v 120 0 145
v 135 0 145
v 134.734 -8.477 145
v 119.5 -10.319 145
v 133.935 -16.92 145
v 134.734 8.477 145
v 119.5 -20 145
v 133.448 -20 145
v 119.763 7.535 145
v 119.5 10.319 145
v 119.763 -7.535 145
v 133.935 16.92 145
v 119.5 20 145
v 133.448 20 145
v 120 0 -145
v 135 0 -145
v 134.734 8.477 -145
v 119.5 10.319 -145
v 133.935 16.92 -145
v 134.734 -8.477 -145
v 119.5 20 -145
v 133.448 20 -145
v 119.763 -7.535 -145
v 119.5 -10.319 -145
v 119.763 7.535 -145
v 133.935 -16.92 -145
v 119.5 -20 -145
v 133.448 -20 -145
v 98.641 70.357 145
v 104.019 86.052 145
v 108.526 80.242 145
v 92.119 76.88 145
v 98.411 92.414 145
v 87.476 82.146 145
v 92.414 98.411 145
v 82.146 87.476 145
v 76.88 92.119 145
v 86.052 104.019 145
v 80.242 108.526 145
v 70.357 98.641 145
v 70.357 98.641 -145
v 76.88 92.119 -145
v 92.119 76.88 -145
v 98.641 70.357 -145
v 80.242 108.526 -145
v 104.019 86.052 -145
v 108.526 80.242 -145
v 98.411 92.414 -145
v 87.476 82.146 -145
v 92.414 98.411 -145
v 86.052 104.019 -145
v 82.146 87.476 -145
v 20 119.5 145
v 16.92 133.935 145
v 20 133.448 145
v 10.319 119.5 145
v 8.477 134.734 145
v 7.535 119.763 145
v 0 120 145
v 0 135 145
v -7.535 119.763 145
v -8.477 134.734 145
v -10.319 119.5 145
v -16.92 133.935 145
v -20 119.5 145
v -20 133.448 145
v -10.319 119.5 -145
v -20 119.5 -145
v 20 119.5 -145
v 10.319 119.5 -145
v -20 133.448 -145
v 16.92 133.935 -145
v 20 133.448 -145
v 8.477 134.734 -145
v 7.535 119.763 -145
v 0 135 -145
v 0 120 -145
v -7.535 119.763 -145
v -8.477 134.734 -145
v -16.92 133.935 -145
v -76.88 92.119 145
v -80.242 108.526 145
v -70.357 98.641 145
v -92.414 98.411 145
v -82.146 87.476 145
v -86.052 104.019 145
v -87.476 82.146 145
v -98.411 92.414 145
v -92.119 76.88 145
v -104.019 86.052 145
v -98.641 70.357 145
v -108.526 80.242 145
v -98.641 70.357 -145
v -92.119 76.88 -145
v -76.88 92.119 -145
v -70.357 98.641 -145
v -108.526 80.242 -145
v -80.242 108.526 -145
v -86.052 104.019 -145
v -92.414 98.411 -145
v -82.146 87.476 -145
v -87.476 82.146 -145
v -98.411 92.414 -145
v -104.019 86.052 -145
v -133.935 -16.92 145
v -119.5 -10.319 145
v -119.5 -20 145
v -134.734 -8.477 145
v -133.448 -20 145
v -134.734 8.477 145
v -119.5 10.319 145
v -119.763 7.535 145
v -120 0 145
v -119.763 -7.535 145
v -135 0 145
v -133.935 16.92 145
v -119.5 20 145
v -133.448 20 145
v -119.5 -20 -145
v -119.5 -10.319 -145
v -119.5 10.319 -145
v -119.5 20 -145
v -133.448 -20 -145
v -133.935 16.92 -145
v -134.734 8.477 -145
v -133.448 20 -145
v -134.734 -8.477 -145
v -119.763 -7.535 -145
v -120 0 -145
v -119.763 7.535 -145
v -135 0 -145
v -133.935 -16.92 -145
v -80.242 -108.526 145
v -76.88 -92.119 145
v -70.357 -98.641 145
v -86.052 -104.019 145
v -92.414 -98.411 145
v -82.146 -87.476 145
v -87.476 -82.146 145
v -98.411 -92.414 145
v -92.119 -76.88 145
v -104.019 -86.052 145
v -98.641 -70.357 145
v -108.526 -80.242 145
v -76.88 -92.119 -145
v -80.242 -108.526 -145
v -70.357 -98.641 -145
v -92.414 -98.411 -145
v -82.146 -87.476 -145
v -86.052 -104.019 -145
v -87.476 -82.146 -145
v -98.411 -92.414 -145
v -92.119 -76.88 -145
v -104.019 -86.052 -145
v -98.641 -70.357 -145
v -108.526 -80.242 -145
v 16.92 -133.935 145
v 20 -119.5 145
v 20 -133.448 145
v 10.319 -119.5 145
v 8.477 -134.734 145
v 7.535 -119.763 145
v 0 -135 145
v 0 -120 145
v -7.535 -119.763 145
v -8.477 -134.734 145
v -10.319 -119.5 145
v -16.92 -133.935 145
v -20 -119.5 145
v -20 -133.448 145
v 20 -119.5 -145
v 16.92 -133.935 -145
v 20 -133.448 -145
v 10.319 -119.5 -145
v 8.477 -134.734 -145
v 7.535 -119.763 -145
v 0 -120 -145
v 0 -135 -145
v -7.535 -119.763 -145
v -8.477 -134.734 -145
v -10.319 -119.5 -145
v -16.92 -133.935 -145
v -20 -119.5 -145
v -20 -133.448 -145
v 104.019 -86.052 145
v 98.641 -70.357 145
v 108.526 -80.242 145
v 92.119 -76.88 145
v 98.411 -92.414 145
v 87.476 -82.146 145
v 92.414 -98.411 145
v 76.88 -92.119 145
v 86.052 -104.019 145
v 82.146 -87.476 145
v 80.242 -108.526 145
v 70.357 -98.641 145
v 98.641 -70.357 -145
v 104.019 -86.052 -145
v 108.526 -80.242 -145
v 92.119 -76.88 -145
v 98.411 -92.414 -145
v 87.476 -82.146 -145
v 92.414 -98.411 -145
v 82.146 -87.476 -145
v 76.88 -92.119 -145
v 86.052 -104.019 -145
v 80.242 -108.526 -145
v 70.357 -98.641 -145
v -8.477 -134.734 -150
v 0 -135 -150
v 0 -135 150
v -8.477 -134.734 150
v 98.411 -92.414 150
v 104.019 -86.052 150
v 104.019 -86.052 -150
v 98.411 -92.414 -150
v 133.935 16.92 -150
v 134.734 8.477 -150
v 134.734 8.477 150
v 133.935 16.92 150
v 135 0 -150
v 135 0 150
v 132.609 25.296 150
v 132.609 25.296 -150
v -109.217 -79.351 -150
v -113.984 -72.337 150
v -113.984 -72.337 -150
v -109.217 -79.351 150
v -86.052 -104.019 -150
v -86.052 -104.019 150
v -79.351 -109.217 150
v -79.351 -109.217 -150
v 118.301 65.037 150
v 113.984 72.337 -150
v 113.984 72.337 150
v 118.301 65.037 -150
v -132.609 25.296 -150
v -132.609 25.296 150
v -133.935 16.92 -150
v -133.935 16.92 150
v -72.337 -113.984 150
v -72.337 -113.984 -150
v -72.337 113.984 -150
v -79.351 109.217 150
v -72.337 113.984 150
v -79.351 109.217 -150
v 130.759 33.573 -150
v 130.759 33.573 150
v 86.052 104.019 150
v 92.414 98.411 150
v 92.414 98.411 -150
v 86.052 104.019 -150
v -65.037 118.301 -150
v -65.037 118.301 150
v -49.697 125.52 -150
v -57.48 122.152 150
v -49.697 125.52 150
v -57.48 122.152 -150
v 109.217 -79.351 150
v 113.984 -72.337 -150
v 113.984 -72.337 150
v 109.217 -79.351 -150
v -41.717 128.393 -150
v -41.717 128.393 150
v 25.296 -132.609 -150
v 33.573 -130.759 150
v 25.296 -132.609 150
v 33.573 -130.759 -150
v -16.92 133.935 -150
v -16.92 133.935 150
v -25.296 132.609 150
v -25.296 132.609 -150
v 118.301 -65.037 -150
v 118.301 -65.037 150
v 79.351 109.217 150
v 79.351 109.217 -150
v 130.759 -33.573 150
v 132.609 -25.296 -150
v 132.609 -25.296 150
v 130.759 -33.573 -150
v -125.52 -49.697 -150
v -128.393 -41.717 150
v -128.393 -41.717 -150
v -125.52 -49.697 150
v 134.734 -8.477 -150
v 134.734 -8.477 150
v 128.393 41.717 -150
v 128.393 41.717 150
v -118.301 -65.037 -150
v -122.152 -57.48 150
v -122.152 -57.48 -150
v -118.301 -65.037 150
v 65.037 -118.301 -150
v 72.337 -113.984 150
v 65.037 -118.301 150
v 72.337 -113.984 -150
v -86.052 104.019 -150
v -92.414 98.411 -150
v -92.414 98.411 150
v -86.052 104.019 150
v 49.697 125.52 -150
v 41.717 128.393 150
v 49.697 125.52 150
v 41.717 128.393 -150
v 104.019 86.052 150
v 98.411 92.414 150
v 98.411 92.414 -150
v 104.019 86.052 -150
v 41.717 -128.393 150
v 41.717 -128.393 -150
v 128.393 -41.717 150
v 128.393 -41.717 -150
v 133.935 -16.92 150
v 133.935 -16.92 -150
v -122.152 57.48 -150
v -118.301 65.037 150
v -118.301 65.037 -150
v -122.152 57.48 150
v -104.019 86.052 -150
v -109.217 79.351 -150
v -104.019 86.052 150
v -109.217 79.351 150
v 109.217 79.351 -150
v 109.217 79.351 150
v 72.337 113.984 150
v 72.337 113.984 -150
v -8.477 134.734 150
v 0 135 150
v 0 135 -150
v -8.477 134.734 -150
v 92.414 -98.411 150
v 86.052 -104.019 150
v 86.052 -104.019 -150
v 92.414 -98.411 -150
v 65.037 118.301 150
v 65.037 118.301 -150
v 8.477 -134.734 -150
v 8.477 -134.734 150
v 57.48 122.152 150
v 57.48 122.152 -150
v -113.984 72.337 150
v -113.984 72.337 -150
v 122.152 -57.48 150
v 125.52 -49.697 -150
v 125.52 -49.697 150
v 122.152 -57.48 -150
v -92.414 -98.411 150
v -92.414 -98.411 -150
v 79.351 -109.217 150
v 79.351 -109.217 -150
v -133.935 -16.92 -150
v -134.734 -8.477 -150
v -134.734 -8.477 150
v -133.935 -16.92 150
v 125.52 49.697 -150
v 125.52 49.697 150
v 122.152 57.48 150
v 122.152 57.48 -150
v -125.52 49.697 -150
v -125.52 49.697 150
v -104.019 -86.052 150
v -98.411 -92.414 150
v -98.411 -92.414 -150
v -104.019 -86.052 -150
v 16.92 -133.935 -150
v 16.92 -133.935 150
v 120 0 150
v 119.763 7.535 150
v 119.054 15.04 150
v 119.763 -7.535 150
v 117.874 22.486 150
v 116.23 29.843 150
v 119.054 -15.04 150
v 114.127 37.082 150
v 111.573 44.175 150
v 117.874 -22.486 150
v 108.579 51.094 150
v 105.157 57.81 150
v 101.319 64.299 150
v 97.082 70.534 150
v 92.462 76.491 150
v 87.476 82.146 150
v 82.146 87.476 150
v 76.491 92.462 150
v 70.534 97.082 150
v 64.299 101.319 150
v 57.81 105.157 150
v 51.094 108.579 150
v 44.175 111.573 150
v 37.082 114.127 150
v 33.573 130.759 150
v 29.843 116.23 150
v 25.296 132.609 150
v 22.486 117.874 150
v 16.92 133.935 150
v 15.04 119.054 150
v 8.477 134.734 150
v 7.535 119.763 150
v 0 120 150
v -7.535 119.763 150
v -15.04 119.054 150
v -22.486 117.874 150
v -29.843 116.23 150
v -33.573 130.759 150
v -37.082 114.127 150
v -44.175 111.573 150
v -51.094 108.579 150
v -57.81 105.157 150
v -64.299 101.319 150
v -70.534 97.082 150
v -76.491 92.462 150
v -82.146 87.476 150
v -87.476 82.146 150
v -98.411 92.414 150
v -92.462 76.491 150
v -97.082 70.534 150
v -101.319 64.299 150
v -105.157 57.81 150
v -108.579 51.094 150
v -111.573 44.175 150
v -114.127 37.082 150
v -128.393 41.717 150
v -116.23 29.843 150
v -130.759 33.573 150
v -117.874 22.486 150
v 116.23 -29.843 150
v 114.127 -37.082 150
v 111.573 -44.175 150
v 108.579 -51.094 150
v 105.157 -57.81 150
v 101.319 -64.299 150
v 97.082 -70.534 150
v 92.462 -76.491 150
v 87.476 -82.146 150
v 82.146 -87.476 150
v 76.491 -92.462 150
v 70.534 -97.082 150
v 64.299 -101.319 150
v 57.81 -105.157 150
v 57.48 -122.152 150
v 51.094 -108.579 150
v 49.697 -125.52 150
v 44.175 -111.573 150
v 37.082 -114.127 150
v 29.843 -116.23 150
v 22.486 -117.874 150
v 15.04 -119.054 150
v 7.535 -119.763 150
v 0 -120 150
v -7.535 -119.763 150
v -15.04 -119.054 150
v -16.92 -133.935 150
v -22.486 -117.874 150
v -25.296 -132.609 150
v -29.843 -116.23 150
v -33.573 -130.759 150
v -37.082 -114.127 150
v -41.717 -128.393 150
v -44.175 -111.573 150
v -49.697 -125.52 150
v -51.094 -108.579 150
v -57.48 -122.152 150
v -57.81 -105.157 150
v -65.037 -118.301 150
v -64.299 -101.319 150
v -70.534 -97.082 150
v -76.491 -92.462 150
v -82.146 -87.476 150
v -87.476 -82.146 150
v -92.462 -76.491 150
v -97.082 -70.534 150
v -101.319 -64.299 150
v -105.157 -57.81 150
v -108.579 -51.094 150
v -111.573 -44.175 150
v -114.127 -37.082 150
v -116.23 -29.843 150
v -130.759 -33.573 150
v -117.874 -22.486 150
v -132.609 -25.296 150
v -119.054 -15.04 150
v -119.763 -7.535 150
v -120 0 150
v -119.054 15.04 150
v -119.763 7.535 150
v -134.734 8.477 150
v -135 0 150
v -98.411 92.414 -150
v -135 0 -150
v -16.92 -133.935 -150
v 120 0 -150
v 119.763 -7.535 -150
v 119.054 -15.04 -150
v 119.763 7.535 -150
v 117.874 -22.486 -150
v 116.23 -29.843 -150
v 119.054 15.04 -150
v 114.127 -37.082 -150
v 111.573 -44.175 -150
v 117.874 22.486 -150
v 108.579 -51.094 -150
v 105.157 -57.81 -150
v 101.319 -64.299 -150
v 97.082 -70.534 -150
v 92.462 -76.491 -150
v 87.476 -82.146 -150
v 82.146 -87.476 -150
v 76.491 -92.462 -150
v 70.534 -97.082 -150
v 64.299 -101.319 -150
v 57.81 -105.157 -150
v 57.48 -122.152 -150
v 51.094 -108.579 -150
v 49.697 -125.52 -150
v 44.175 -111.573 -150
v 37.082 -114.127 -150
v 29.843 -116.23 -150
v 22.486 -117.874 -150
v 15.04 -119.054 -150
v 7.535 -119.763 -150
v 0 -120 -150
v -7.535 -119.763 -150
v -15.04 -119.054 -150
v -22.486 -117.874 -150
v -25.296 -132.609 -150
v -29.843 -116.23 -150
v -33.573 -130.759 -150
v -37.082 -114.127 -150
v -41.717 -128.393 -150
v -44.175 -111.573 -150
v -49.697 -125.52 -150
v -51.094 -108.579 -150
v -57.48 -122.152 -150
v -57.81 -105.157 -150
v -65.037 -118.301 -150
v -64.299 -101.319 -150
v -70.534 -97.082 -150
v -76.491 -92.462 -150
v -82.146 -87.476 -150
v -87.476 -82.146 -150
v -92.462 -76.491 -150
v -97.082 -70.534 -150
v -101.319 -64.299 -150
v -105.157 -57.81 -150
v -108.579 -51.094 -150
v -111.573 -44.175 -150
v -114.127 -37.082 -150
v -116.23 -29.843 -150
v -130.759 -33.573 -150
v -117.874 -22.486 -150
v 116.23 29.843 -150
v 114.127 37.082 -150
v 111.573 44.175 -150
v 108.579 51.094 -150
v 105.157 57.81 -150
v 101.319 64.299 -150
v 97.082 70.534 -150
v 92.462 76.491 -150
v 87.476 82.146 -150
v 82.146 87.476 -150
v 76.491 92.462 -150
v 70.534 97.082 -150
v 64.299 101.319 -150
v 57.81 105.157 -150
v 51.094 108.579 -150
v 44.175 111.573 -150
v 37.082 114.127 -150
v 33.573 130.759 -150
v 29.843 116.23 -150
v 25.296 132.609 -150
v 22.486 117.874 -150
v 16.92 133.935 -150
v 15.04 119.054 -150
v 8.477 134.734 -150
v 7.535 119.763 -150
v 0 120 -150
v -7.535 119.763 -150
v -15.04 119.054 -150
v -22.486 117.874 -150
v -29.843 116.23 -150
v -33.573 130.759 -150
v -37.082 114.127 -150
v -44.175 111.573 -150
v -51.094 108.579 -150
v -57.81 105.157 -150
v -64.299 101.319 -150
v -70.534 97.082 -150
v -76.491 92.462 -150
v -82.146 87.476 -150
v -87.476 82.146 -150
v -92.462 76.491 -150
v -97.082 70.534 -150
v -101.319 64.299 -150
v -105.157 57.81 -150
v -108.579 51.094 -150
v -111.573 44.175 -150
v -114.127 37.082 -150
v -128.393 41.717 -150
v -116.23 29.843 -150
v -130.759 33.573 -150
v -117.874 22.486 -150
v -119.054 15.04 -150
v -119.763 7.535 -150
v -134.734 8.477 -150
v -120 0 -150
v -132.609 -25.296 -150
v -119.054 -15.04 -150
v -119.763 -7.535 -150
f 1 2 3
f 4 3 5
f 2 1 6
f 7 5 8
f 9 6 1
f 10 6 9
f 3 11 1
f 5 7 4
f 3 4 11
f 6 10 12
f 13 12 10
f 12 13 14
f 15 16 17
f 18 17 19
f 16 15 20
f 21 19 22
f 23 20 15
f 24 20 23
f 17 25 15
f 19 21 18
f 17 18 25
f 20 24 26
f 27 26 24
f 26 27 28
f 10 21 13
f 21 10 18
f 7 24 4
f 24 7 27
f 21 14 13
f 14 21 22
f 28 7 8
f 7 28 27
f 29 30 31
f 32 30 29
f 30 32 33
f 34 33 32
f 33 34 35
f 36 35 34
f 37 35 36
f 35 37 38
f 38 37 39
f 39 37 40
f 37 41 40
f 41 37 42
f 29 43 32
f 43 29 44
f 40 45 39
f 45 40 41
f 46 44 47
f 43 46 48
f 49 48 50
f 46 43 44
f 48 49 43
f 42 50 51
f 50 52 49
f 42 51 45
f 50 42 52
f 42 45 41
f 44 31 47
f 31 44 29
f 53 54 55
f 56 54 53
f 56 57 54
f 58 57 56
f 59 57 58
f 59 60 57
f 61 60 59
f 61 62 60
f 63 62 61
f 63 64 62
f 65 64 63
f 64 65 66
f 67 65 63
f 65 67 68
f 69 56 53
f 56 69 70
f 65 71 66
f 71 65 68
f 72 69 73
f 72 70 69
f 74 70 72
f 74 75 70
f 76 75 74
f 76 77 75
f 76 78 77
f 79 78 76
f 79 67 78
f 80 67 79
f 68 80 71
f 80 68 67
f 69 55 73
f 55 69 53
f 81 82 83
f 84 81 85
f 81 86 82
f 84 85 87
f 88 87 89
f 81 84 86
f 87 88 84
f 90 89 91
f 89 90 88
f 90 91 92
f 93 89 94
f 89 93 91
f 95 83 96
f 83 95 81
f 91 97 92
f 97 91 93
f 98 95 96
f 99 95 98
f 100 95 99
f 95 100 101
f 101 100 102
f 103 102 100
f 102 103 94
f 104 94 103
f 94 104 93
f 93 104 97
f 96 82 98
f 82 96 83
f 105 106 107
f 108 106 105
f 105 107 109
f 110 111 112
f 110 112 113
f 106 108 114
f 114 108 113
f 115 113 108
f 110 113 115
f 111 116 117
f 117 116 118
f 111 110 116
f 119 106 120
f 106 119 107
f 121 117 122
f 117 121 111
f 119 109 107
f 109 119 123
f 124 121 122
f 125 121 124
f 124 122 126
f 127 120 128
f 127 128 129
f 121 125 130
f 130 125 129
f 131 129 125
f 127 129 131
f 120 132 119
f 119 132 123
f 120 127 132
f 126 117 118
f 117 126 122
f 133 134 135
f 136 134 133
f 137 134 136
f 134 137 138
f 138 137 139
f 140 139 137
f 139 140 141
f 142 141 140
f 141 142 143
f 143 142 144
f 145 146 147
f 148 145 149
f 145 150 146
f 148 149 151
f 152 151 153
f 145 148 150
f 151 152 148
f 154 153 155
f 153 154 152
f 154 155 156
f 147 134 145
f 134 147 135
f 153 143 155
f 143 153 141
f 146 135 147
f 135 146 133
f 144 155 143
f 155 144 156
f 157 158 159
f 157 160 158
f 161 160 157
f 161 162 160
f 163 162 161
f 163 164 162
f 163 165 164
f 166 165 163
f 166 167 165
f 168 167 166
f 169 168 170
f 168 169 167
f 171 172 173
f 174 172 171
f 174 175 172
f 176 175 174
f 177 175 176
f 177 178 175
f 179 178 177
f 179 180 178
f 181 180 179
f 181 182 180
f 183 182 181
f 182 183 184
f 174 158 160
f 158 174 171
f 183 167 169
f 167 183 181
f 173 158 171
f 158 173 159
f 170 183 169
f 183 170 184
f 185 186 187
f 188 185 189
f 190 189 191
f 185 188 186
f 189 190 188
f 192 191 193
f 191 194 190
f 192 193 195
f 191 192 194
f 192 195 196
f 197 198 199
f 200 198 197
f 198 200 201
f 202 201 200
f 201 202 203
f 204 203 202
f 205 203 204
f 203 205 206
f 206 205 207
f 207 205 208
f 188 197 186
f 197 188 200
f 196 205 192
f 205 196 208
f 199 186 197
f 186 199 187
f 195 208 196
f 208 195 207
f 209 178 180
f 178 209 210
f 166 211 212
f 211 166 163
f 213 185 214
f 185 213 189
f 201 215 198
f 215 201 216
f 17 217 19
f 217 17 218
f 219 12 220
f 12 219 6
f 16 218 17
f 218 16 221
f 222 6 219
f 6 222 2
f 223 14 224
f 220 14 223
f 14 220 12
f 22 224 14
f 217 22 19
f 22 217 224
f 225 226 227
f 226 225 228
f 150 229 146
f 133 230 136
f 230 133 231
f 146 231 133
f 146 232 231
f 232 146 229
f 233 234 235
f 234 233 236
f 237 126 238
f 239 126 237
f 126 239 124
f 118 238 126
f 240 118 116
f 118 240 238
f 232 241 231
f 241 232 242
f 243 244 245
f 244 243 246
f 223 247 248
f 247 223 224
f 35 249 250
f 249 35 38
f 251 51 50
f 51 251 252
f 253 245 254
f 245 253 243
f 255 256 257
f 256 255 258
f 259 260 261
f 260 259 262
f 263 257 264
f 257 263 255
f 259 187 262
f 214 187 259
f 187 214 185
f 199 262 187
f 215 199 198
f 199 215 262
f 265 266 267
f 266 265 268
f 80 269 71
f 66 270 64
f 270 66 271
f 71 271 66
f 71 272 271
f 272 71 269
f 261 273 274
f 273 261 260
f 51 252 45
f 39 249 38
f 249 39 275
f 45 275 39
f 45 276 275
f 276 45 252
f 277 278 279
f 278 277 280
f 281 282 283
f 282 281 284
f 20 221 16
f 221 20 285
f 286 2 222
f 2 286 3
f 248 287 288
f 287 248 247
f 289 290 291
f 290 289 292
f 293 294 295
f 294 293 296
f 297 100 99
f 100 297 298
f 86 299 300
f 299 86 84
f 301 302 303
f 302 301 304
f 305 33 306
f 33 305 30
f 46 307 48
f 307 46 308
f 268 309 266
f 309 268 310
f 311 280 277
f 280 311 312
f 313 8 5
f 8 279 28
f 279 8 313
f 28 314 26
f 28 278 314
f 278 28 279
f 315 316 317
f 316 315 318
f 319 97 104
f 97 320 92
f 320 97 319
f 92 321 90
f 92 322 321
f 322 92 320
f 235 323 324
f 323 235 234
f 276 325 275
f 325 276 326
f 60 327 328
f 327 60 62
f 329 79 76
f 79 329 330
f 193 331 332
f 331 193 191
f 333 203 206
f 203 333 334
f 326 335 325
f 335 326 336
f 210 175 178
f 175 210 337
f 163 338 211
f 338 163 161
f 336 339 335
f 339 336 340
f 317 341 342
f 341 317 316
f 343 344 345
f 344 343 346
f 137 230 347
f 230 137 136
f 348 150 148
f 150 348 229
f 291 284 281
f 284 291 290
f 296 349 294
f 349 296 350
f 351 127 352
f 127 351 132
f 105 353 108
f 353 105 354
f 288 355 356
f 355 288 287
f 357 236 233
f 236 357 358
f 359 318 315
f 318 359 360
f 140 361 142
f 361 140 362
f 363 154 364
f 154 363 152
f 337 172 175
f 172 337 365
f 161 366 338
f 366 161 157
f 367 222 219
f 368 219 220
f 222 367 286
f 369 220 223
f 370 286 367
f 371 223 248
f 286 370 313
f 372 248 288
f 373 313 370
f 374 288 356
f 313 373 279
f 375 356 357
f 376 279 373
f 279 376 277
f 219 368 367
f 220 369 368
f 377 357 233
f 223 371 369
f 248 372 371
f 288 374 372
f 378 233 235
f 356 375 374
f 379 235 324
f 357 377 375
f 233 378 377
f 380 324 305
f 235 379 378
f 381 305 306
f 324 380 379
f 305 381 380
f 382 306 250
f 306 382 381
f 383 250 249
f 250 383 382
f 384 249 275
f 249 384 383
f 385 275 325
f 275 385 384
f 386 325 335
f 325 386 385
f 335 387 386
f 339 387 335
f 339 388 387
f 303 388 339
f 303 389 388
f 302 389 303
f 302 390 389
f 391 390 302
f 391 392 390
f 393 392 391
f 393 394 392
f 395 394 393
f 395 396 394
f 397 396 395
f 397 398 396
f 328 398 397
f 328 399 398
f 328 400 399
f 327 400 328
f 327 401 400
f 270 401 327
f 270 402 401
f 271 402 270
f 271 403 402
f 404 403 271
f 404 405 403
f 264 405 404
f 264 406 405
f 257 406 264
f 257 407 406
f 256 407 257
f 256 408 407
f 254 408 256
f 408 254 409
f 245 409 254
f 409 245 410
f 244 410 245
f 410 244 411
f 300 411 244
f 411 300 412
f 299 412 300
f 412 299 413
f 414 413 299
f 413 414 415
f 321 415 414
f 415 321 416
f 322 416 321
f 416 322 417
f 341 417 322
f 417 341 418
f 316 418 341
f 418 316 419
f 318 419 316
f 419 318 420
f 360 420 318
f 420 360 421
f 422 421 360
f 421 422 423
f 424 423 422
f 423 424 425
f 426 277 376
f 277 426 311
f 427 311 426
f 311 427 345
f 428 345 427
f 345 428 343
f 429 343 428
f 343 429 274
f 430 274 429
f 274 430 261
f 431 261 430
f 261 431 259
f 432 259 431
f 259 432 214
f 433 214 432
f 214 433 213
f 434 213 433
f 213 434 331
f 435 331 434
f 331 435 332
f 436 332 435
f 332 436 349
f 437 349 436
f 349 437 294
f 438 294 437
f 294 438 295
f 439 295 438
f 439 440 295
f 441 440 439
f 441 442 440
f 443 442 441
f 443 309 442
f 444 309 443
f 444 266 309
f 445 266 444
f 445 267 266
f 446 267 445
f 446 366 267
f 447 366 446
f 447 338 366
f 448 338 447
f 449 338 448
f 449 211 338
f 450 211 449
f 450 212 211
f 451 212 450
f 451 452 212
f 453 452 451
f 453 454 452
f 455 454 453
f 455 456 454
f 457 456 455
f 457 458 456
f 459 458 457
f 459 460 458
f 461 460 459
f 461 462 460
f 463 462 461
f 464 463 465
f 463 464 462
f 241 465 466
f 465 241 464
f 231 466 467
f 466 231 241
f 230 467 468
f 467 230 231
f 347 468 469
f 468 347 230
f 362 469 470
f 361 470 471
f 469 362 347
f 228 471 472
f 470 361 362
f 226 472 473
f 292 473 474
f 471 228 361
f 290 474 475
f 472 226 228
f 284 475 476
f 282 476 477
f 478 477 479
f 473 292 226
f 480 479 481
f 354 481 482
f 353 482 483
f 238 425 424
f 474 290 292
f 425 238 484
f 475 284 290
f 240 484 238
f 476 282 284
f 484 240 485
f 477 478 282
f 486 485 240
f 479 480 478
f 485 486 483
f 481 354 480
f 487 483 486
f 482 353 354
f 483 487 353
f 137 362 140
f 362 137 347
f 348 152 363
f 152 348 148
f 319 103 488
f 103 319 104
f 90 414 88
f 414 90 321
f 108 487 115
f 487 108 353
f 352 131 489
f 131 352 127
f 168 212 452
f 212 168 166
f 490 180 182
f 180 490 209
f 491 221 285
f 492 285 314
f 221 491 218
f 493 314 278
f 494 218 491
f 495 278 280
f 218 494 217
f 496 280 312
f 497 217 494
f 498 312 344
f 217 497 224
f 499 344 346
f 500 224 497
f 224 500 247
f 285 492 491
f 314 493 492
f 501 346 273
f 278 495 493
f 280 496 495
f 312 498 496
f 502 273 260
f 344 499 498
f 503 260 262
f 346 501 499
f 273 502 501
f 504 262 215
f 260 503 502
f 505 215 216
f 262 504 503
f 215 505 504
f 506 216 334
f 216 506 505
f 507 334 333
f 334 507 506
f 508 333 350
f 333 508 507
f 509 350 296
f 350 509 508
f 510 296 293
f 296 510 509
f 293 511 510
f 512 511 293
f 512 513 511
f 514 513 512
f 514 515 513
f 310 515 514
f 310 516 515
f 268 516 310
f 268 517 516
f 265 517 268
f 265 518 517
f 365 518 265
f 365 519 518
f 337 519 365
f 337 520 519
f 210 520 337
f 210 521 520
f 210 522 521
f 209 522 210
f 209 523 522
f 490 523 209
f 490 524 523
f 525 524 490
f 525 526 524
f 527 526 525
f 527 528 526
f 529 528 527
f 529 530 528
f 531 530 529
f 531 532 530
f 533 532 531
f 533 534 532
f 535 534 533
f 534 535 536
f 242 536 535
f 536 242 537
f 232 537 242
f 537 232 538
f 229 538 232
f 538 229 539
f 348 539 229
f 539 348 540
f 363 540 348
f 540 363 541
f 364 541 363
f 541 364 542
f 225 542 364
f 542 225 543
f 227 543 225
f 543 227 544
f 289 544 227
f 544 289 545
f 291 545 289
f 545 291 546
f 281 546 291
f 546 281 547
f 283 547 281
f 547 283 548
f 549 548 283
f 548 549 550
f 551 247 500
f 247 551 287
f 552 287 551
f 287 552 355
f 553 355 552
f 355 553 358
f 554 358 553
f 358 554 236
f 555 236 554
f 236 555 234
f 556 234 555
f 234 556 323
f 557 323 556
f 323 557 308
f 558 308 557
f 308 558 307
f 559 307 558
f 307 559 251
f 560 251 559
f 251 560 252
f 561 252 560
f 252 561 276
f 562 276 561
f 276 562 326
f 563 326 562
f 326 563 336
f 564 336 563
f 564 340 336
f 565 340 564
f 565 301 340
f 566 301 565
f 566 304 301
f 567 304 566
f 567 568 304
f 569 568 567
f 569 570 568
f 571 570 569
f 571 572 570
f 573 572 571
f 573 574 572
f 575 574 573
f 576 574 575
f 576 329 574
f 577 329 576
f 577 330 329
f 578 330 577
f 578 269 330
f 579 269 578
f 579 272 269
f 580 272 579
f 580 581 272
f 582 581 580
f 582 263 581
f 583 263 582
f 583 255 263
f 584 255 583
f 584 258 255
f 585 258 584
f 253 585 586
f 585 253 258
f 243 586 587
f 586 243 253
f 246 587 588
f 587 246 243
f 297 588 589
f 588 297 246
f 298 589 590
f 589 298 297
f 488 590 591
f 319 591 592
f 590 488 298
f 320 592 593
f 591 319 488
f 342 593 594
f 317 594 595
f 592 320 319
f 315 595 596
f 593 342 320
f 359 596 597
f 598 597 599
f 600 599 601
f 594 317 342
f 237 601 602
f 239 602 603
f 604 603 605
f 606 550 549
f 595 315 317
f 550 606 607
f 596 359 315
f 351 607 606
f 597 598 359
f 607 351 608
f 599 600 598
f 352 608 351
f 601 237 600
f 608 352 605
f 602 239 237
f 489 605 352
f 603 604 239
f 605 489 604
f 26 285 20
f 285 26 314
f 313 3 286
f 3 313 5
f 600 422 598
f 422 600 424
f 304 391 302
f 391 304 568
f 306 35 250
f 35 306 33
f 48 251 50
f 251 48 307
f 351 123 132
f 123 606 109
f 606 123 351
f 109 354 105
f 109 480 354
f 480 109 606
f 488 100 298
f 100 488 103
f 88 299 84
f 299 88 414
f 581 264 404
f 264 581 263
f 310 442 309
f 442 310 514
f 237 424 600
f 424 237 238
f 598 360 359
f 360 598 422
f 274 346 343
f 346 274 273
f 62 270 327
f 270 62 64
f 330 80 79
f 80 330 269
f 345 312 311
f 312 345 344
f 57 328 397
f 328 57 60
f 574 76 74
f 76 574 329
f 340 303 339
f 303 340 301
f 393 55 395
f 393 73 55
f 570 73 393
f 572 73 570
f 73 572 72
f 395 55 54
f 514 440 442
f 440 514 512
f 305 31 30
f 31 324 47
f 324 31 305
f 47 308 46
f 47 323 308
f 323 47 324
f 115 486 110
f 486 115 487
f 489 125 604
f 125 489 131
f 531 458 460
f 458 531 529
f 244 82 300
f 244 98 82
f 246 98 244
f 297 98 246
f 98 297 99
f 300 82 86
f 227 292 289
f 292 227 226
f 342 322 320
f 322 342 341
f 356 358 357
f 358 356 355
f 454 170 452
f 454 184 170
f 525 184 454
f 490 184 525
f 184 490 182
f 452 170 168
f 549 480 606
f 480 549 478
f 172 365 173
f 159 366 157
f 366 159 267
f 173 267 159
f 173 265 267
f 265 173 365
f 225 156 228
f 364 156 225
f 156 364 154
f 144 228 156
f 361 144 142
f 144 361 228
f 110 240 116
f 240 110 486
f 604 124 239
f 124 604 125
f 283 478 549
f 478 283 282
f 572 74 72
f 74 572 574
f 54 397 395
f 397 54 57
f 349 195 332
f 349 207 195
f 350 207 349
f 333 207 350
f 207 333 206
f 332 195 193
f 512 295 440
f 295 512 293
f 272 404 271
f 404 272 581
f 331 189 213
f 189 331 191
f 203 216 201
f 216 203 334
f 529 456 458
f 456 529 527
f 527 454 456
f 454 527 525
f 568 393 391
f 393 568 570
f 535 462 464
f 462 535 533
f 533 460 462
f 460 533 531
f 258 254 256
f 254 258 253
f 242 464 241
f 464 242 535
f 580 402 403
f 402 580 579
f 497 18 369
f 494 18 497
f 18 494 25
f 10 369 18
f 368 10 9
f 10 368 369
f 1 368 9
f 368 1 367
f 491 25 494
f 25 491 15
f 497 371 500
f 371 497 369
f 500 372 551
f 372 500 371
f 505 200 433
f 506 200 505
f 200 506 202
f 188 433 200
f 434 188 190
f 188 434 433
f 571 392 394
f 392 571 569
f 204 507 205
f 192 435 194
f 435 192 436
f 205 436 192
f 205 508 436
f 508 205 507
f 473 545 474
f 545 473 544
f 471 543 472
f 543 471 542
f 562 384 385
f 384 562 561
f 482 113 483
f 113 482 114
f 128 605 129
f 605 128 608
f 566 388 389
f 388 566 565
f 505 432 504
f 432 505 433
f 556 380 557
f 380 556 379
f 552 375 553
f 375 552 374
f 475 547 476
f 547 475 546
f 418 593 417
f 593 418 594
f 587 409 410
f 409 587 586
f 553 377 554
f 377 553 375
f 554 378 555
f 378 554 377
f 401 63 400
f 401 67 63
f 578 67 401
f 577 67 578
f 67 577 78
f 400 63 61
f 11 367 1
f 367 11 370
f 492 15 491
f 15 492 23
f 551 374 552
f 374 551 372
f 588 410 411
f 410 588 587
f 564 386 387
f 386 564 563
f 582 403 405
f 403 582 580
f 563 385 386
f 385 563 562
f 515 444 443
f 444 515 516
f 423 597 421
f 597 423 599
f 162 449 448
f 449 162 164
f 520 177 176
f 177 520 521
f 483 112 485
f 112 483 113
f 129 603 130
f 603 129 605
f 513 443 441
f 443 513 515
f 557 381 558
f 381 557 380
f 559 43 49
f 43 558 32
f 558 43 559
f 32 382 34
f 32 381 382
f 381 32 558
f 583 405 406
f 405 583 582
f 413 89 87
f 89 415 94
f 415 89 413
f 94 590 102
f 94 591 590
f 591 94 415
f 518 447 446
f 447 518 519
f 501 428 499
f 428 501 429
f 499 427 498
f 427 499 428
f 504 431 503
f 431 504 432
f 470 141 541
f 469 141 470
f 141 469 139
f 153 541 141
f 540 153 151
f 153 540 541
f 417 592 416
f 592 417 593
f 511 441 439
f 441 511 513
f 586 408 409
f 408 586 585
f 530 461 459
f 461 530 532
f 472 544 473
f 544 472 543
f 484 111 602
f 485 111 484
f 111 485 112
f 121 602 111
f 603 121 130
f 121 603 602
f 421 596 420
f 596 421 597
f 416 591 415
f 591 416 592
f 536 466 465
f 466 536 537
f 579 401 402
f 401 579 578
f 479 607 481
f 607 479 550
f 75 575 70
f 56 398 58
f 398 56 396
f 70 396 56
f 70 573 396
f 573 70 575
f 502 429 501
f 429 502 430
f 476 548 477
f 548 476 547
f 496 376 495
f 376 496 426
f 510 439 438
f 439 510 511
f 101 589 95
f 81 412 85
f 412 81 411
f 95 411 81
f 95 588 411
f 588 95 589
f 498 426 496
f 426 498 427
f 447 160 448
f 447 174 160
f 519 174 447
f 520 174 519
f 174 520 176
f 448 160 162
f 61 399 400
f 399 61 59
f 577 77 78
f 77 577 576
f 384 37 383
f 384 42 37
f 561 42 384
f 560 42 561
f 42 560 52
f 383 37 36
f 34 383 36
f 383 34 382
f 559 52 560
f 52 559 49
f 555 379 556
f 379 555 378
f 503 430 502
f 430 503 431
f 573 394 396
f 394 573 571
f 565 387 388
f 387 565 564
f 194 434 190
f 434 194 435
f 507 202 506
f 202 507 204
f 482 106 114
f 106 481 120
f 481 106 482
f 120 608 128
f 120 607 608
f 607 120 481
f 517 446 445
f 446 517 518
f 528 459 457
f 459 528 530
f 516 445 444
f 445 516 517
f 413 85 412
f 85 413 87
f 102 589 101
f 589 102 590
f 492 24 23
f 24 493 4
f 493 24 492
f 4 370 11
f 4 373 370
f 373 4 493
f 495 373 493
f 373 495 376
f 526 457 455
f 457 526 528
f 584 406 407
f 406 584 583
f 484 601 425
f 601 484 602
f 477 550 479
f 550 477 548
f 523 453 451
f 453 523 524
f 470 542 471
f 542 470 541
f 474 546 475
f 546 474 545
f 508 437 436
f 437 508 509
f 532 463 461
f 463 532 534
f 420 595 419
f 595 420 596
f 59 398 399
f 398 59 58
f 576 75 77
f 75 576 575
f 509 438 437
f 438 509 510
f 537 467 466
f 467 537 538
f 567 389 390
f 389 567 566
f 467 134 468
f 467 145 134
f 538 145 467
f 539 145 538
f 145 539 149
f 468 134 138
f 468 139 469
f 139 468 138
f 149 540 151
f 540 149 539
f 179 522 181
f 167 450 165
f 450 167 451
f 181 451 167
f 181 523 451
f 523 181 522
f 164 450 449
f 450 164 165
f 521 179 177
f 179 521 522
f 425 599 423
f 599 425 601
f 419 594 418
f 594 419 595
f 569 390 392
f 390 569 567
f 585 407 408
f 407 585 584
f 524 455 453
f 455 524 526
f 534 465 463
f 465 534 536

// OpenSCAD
// OpenSCAD snippet for a modular Peltier cooling block assembly around the MV motor frame
module peltier_plate_array(motor_radius, length, plate_thickness, plate_count) {
    echo("Integrating Peltier Plates for USS Iowa Project");
    
    difference() {
        // Outer jacket block capturing motor casing heat
        cylinder(r = motor_radius + plate_thickness, h = length, center = true, $fn=100);
        
        // Internal cutout mapping exactly to the Siemens MV motor radius
        cylinder(r = motor_radius, h = length + 2, center = true, $fn=100);
        
        // Fluidic multi-channel sensor array venting slots
        for (i = [0 : plate_count - 1]) {
            rotate([0, 0, i * (360 / plate_count)])
            translate([motor_radius + (plate_thickness / 2), 0, 0])
            cube([plate_thickness + 1, 40, length - 10], center = true);
        }
    }
}

// Instantiate with custom variables matching your SCAD repository parameters
peltier_plate_array(motor_radius=120, length=300, plate_thickness=15, plate_count=8);
